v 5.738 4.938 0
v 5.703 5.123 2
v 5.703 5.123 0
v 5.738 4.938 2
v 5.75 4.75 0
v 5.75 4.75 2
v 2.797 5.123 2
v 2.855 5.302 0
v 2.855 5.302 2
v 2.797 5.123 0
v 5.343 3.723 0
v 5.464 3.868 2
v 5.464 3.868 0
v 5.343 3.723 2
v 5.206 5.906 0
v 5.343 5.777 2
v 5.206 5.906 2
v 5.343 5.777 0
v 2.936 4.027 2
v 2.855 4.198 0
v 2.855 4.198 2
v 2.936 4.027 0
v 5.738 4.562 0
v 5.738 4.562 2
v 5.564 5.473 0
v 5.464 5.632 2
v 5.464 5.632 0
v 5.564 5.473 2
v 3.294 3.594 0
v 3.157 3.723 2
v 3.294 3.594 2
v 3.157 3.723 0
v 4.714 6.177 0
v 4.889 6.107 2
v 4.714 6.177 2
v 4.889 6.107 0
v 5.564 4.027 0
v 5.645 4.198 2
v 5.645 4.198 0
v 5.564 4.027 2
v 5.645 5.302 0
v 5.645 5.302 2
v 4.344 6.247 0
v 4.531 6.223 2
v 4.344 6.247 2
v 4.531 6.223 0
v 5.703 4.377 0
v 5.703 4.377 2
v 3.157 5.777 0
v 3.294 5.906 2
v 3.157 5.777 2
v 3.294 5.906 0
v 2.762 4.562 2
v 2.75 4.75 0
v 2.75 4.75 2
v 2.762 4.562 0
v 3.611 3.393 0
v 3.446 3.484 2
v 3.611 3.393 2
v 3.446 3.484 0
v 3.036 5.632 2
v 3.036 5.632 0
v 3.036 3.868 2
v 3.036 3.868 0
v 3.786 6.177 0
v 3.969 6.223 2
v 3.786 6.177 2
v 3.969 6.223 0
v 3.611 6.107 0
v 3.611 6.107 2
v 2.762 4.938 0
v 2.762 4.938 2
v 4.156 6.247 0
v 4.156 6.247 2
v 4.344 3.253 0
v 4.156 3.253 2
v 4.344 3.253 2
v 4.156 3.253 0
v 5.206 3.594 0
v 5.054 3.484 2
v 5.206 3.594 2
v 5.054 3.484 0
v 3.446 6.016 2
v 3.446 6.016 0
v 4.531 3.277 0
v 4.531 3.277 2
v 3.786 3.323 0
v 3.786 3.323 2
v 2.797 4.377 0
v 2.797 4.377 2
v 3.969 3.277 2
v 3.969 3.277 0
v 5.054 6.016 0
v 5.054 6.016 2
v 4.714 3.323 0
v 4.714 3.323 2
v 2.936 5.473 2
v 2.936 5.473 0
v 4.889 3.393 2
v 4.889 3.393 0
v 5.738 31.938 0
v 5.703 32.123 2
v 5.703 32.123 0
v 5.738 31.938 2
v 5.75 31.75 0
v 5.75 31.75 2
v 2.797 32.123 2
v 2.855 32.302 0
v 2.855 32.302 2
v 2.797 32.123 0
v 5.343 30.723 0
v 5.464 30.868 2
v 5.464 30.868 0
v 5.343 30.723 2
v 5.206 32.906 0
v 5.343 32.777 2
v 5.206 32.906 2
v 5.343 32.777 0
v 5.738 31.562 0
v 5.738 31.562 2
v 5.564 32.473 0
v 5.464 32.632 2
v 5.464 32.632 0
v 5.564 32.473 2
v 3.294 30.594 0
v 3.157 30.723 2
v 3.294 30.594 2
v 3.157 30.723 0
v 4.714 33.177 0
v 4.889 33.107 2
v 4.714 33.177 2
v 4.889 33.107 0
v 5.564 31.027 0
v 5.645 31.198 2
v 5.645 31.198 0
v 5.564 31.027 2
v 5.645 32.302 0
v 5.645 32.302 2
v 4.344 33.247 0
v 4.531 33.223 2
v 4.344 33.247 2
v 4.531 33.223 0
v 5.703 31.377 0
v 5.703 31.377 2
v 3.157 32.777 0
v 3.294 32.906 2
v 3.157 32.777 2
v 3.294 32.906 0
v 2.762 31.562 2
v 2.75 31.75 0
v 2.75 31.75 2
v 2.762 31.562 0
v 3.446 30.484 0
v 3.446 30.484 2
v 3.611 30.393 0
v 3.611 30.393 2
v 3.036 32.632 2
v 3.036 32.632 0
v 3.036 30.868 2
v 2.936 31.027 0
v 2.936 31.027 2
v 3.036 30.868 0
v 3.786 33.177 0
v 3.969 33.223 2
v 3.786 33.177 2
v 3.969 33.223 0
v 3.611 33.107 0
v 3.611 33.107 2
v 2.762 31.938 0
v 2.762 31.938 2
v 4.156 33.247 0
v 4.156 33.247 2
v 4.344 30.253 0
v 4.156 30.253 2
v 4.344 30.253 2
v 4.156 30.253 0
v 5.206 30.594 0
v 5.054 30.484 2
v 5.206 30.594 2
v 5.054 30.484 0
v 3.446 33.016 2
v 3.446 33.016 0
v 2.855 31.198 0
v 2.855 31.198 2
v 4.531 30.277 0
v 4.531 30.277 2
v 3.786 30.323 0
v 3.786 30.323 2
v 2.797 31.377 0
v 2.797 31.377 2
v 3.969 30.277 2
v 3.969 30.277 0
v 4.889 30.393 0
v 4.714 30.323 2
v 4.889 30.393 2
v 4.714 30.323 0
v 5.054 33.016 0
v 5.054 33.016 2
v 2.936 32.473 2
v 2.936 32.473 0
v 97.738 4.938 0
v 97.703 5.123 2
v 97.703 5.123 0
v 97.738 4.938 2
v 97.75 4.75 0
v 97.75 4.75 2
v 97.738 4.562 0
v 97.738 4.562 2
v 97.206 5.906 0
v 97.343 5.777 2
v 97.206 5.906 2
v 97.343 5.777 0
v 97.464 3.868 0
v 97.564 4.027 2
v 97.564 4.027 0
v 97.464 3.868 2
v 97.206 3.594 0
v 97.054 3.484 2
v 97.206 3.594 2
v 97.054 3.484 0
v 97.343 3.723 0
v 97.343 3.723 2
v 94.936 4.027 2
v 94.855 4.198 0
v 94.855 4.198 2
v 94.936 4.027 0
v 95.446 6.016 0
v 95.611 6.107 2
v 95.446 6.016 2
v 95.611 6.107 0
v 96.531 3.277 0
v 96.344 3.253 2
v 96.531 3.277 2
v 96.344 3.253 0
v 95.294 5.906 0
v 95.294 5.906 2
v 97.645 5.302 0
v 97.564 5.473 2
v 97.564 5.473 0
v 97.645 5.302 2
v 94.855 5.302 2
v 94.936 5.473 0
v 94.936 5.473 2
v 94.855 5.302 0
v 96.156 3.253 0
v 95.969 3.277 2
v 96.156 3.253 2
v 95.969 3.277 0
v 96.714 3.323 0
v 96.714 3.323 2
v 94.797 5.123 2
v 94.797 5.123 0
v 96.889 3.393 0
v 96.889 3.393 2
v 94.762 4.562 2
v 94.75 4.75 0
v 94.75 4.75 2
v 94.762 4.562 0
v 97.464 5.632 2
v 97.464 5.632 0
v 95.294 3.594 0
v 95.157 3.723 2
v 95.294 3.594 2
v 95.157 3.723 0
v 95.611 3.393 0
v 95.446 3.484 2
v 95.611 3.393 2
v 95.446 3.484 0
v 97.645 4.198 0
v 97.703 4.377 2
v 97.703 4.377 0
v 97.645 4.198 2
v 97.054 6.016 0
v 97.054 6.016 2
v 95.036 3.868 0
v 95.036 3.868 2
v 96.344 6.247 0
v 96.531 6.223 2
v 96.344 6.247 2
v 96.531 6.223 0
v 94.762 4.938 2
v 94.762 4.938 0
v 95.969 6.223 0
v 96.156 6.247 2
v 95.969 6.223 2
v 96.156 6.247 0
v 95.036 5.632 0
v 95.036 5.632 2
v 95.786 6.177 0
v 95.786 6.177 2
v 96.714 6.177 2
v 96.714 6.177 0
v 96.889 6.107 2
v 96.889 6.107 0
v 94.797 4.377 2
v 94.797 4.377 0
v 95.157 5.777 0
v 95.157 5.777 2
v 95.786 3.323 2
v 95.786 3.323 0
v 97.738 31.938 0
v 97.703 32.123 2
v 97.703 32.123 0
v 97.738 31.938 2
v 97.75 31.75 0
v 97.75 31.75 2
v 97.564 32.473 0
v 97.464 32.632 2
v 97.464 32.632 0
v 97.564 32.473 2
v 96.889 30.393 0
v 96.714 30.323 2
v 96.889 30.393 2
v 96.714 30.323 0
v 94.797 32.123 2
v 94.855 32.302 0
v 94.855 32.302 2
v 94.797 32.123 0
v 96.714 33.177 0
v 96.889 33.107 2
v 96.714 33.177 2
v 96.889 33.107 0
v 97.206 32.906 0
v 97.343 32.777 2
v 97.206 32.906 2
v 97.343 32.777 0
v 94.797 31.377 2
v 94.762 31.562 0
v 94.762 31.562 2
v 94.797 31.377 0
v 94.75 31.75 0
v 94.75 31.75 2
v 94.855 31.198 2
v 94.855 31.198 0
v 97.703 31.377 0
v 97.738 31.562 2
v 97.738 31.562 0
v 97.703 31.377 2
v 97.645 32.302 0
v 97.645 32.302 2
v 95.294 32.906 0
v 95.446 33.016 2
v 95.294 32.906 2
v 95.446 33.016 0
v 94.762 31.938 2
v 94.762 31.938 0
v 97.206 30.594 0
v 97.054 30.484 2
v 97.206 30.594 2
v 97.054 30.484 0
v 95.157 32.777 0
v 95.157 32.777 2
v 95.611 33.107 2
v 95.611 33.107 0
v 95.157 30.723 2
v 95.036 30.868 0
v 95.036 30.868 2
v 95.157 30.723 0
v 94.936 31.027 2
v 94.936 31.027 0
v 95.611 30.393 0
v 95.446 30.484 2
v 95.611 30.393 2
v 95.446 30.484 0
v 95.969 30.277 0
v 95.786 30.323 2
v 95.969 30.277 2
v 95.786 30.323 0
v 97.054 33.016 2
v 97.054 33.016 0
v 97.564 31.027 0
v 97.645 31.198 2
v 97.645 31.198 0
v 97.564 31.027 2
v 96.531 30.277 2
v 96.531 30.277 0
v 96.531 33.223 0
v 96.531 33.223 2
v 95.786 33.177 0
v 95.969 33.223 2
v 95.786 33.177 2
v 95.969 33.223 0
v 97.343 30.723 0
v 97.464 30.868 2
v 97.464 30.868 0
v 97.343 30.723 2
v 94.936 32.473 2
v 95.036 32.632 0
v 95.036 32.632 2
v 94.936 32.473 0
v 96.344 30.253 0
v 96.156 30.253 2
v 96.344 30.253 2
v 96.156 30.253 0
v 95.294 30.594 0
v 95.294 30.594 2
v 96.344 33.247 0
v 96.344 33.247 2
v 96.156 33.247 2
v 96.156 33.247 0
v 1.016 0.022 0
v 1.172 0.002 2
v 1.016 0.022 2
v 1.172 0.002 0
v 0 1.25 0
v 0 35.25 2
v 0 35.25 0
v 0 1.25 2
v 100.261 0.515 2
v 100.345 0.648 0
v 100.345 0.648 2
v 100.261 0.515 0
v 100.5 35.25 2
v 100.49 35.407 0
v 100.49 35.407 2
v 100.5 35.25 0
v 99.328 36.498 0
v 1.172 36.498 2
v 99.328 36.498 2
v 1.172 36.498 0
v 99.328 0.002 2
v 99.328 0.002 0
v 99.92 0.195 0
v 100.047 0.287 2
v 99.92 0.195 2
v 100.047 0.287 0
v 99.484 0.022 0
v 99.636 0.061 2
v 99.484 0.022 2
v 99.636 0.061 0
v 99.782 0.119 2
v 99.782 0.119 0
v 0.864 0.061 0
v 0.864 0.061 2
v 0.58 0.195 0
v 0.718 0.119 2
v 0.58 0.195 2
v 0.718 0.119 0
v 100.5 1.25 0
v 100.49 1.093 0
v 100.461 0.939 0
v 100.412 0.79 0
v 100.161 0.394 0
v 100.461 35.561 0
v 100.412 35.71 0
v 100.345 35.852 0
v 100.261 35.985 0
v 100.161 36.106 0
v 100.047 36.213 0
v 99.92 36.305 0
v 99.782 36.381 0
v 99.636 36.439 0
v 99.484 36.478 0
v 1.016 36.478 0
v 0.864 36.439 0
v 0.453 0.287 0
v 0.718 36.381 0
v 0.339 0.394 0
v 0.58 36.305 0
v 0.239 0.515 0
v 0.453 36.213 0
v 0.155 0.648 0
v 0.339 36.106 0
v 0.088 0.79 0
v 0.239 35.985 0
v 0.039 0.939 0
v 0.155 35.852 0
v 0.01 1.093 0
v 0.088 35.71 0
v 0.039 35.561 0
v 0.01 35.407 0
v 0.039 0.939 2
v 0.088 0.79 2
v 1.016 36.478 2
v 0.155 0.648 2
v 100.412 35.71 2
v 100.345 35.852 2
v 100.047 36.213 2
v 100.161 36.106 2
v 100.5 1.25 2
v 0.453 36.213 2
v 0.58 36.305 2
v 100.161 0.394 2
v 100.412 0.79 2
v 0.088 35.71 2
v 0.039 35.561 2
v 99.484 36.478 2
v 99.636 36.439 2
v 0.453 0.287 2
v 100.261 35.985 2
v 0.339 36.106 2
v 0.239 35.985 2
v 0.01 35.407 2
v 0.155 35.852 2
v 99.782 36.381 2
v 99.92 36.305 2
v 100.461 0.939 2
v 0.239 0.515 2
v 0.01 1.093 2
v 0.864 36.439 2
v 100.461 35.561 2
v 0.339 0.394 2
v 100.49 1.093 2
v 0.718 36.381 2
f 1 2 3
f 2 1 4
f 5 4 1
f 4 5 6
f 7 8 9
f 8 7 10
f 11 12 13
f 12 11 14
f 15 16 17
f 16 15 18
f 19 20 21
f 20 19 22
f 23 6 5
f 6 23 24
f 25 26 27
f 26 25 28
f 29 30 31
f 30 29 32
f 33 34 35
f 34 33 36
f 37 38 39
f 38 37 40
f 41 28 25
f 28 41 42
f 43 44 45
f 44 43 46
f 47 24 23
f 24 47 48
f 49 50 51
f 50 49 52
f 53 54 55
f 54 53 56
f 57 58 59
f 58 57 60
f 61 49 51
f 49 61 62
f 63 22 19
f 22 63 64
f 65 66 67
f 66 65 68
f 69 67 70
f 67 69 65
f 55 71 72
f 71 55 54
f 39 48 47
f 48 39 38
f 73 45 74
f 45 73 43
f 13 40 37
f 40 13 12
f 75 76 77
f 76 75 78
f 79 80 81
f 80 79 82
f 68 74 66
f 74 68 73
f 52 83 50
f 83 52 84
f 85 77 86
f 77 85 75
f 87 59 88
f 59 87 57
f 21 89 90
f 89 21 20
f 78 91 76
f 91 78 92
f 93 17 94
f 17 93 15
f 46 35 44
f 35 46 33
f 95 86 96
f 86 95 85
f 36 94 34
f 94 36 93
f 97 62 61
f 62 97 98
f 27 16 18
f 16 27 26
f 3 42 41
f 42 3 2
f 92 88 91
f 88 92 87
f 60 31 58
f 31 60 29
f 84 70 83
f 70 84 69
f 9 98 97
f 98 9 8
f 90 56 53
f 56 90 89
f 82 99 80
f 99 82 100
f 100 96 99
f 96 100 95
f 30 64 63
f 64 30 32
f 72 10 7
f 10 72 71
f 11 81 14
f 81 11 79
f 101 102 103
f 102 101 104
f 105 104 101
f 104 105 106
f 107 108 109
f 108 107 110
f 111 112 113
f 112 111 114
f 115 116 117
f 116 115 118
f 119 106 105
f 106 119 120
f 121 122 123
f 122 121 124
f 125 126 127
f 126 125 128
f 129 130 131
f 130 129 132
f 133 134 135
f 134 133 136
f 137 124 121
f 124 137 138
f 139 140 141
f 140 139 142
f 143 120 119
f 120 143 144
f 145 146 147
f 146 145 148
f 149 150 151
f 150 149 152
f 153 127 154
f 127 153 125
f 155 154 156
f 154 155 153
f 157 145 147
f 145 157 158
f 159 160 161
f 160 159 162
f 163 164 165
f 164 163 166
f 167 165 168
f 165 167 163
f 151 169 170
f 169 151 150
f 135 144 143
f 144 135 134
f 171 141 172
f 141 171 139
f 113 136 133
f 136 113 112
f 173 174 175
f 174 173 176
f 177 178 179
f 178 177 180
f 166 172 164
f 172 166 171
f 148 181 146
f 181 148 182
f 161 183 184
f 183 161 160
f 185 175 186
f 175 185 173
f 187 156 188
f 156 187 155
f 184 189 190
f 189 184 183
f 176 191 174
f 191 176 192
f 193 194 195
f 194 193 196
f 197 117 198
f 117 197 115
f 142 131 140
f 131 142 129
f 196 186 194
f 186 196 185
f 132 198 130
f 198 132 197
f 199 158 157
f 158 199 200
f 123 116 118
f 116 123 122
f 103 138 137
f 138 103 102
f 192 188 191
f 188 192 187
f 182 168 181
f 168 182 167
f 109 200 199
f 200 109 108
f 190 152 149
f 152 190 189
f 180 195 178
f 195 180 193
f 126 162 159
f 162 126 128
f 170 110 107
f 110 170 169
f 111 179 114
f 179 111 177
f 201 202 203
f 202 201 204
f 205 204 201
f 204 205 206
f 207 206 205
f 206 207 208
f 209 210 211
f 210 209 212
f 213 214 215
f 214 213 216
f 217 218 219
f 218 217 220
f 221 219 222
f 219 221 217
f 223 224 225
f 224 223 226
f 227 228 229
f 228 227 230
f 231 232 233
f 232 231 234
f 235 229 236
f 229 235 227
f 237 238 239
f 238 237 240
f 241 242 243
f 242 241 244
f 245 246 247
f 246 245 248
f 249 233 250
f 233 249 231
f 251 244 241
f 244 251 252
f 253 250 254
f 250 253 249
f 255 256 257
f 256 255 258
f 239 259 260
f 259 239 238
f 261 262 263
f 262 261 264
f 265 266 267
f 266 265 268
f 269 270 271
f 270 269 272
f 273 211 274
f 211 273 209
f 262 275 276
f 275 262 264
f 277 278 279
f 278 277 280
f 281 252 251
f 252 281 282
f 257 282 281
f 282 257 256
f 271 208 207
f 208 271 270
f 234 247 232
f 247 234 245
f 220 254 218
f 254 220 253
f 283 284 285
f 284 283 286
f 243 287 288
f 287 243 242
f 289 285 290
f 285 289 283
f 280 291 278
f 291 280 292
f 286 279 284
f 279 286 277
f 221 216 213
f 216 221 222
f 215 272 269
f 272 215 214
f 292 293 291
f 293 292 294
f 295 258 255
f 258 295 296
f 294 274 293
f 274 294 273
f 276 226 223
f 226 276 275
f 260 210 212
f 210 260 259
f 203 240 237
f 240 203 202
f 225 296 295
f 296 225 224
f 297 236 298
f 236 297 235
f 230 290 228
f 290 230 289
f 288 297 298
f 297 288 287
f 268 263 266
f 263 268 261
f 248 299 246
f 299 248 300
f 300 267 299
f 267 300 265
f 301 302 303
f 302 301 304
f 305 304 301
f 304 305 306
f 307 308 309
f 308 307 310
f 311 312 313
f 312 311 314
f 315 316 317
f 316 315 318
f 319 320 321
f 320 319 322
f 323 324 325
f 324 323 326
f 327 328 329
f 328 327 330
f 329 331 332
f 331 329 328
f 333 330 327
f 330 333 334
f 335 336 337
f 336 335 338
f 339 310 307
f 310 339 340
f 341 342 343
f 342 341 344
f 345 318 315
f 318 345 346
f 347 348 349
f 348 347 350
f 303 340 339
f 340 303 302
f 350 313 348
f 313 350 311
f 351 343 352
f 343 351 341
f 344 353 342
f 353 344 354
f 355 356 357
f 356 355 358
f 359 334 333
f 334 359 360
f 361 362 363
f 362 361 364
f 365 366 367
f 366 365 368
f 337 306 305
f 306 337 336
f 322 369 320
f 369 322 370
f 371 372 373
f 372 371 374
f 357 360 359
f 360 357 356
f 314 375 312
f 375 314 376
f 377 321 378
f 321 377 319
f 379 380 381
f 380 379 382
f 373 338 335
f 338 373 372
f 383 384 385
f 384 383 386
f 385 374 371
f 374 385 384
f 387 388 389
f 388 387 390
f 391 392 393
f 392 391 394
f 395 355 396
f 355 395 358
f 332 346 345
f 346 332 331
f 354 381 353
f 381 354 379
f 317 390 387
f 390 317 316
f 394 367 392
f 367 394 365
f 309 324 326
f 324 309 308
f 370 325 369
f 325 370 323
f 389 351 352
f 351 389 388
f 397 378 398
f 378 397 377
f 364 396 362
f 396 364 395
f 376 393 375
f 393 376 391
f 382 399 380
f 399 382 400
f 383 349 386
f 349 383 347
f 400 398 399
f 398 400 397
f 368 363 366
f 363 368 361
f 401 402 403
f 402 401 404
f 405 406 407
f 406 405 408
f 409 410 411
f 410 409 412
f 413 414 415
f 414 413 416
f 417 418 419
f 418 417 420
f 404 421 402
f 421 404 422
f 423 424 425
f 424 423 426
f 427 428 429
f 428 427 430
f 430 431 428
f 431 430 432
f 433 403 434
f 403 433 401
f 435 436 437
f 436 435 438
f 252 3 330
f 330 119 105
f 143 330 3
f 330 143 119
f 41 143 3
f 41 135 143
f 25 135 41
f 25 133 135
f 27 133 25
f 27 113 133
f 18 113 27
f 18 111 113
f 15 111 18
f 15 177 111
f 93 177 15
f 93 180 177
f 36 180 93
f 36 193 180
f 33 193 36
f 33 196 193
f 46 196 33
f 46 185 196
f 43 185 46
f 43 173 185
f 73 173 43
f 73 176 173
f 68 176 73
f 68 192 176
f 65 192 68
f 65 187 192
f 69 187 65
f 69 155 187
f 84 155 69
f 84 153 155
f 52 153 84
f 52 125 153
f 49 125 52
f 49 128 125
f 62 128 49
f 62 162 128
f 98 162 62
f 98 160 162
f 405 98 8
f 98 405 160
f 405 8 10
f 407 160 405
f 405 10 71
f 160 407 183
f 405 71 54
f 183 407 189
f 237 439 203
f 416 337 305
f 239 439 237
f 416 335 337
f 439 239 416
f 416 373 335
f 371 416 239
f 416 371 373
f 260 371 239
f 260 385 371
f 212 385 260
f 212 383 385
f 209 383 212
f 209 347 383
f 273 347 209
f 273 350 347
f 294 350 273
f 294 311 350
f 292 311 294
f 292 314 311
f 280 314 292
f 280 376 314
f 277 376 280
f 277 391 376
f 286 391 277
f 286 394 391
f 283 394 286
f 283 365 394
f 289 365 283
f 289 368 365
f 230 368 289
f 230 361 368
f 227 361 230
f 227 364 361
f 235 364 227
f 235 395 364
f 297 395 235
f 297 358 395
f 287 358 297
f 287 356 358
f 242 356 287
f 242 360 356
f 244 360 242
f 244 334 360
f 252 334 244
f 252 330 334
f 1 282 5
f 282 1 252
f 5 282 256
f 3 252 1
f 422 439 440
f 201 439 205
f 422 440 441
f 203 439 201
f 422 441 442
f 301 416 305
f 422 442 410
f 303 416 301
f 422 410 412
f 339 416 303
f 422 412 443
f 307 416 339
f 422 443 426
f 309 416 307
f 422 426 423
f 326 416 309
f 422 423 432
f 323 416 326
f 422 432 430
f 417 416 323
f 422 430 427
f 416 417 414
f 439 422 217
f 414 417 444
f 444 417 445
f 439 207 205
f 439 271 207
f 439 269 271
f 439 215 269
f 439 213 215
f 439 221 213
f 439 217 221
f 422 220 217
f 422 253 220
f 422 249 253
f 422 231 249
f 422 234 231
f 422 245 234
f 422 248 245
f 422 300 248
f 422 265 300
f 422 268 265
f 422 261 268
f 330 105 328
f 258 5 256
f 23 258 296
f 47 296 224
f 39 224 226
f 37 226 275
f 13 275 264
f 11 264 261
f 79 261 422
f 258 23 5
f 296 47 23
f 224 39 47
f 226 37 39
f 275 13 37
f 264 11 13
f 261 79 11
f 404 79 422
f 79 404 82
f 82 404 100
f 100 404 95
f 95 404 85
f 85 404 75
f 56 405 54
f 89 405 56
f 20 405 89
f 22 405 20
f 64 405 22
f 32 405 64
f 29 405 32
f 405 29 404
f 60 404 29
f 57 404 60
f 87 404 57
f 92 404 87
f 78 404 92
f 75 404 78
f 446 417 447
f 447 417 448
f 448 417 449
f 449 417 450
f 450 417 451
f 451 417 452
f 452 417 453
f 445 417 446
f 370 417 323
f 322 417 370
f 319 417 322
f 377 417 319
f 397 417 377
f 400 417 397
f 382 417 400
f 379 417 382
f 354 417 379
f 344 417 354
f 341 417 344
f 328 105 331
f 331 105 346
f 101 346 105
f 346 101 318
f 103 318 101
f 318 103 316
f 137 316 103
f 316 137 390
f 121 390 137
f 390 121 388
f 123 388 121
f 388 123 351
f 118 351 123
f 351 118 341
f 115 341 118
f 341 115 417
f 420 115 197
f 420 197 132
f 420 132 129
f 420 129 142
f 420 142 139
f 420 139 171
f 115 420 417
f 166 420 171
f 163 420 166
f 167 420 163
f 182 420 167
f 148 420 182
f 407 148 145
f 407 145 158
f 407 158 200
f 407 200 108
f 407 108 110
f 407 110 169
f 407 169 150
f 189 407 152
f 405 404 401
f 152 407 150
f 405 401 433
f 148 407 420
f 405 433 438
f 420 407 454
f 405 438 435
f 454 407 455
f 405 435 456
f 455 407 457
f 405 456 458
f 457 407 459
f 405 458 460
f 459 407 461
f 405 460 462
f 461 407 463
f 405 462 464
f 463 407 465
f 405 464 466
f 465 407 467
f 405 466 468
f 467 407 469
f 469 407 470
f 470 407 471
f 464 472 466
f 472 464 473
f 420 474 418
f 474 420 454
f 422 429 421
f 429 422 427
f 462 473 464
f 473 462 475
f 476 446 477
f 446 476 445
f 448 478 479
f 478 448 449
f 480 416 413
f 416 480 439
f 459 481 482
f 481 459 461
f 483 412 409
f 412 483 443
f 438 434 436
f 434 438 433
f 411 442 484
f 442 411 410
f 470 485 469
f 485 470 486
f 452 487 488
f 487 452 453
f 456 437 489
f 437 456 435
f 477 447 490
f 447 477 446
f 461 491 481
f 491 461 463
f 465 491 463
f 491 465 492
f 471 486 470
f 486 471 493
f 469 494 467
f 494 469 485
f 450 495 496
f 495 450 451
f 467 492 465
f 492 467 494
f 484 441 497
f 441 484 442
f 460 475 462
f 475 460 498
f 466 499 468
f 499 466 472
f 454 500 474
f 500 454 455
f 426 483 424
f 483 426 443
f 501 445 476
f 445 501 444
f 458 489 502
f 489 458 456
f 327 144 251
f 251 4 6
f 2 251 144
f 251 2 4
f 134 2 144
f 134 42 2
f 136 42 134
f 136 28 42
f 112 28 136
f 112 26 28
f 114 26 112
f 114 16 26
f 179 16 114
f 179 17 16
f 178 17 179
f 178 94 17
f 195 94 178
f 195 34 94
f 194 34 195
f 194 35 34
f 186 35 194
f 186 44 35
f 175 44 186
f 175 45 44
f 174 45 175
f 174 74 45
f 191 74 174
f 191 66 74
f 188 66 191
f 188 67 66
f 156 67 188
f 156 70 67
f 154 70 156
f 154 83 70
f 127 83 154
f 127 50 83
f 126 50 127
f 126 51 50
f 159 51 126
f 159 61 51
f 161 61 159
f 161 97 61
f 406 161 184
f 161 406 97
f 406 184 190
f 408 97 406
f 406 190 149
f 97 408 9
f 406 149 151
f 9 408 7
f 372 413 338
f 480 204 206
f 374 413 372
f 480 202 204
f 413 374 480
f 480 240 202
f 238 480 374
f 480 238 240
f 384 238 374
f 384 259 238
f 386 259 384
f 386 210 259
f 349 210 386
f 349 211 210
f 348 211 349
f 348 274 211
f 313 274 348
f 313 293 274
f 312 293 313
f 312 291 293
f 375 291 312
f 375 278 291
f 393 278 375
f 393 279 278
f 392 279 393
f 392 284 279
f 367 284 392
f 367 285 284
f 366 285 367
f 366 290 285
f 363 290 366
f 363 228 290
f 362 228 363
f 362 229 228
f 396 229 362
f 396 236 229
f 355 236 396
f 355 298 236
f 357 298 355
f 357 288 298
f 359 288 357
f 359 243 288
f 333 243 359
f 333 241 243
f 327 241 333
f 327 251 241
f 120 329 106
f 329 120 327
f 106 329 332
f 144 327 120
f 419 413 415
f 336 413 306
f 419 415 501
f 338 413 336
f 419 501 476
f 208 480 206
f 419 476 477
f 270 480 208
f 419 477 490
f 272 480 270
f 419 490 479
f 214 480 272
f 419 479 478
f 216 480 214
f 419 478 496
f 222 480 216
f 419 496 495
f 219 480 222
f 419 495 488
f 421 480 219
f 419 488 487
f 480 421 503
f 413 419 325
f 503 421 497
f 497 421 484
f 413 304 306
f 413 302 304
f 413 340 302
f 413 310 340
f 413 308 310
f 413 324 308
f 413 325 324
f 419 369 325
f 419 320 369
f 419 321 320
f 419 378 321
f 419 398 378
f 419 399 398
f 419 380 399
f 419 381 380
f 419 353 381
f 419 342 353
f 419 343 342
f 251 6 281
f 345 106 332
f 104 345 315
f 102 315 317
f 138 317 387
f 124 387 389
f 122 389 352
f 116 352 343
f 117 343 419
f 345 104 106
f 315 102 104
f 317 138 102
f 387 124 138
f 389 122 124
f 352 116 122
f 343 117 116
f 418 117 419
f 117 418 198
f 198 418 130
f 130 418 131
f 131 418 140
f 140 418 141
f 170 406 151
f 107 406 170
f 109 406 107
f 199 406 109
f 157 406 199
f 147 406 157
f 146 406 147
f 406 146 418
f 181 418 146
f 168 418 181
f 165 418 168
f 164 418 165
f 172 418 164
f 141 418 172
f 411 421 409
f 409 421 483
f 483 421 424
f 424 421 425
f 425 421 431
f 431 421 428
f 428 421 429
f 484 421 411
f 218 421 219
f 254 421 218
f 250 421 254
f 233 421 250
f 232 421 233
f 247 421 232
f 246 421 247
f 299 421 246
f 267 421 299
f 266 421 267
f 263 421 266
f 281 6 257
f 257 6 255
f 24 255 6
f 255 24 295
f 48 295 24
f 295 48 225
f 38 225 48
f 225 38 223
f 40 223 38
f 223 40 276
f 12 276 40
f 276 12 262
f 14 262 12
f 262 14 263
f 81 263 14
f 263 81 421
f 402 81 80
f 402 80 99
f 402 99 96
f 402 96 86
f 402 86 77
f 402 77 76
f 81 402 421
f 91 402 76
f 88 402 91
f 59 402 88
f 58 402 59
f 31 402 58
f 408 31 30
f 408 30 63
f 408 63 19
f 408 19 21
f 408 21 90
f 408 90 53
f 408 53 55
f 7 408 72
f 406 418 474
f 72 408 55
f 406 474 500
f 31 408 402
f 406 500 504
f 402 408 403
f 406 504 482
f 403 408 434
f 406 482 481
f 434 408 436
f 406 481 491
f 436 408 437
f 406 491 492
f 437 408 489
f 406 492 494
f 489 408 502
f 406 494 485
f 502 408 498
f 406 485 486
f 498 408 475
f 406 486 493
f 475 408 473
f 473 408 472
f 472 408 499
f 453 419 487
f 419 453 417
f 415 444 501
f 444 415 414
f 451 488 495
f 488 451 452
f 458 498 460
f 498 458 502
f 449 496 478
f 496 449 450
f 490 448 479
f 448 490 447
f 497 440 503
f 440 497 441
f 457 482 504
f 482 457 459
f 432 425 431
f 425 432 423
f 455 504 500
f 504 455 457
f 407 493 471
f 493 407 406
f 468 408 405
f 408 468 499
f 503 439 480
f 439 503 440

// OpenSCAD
/* Rounded Rectangle with drill holes
  This is mainly intended for "Pimoroni-Style" electronics housings.
  These are stagged layers of acrylic sheets with cutouts for PCBs, connecctors, displays etc.
  in each Layer. 
*/
$fn=50;
//rndRect(size=[50,100,3],3,2.1,false,"none","layer1",[0,0]);


rndRect(size=[100+0.5,36+0.5,2],radius=1.25,drill=3,drillOffset=[3,3.5],center=false);

 
module rndRect(size=[10,10,1],radius=1,drill=1,diff="none",label="none",drillOffset=[0,0],center=false) {
  fudge=0.1;
  //set radius to minimum if less then size.x or high
  dims = (size.y==undef) ? [size.x,size.x,size.x] : size;
  comp = (size.x>size.z) ? size.y : size.x; //which value to compare to
  radius = (radius>(comp/2)) ?  comp/2 : radius; //set radius
  
  
  cntrOffset = center ? [0,0,-size.z/2] : [size.x/2,size.y/2,0];
  //cntrOffset = [0,0,-size.z/2];
  echo(cntrOffset);
  
  translate(cntrOffset){
    if (diff=="screws"){ //drill holes
      for (i=[-1,1]){ 
        for (j=[-1,1]){
          translate([i*(dims.x/2-radius-drillOffset.x),j*(dims.y/2-radius-drillOffset.y),-fudge/2]) 
            cylinder(h=dims.z+fudge, d=drill);
        }
      }
    }//if screwheads
    
    /*else if (drill>=radius*2){//if drill bigger than radius make screw Head cover
      difference(){
        translate([0,0,dims.z/2]) cube(dims,true); //base is cube
          for (i=[-1:2:1]){
            for (j=[-1:2:1]){
              translate([i*(dims.x/2),j*(dims.y/2),-fudge/2])
                rndRect(drill*2,drill*2,dims.z+fudge,drill/2,0,"none");
                //cylinder(h=dims.z+fudge, d=drill);
              
              translate([i*((dims.x/2)-drill*1.25+fudge/2),j*((dims.y/2)-drill/4+fudge/2),dims.z/2]) 
                difference(){
                  cube([drill/2+fudge,drill/2+fudge,dims.z+fudge],true);
                  translate([i*(-drill/4-fudge/2),j*(-drill/4-fudge/2),-dims.z/2-fudge/2]) cylinder(h=dims.z+fudge,d=drill);
                }
              translate([i*((dims.x/2)-drill/4+fudge/2),j*((dims.y/2)-drill*1.25+fudge/2),dims.z/2]) 
              difference(){
                cube([drill/2+fudge,drill/2+fudge,dims.z+fudge],true);
                translate([i*(-drill/4-fudge/2),j*(-drill/4-fudge/2),-dims.z/2-fudge/2]) cylinder(h=dims.z+fudge,d=drill);
              }
            }
          }
        }//diff
    }//else*/
    
    else { //make rounded plate with screw holes
      difference(){
        hull(){
          for (i=[-1,1]){
            for (j=[-1,1]){
              translate([i*(dims.x/2-radius),j*(dims.y/2-radius),0])
                cylinder(h=dims.z, r=radius);//cube
            }
          }
        }
        for (i=[-1,1]){ //drill holes
          for (j=[-1,1]){
            translate([i*(dims.x/2-radius-drillOffset.x),j*(dims.y/2-radius-drillOffset.y),-fudge/2]) 
              cylinder(h=dims.z+fudge, d=drill);
          }
        }
        //label                    rght, lft, btm, top
        /*if (label!="none") // i,j: -1,0 1,0 0,-1 0,1
          for (i=[ [[1, 0],[90,0, 90]],    //right
                   [[-1, 0],[90,0,-90]],    //left
                   [[ 0,-1],[90,0,  0]],    //front
                   [[ 0,1 ],[90,0,180]] ]){  //back
            
            translate([i[0][0]*(dims.x/2-fudge),i[0][1]*(dims.y/2-fudge),dims.z/2]) // 
              rotate(i[1]) //90,0,90 90,0,-90 90,0,0 90,0,180
                linear_extrude(fudge*2,convexity=10)
                  text(label,halign="center",valign="center",dims=0.6*dims.z);
            
          }//if .. for i
          */
      }//difference
    }//else
    //label                    rght, lft, btm, top
        if (label!="none") // i,j: -1,0 1,0 0,-1 0,1
          for (i=[ [[1, 0],[90,0, 90]],    //right
                   [[-1, 0],[90,0,-90]],    //left
                   [[ 0,-1],[90,0,  0]],    //front
                   [[ 0,1 ],[90,0,180]] ]){  //back
            color("white")
            translate([i[0][0]*(dims.x/2),i[0][1]*(dims.y/2),dims.z/2]) // 
              rotate(i[1]) //90,0,90 90,0,-90 90,0,0 90,0,180
                  text(label,halign="center",valign="center",dims=0.6*dims.z);
            
          }//if .. for i
         
    
  }//cntrOffset
  
}
